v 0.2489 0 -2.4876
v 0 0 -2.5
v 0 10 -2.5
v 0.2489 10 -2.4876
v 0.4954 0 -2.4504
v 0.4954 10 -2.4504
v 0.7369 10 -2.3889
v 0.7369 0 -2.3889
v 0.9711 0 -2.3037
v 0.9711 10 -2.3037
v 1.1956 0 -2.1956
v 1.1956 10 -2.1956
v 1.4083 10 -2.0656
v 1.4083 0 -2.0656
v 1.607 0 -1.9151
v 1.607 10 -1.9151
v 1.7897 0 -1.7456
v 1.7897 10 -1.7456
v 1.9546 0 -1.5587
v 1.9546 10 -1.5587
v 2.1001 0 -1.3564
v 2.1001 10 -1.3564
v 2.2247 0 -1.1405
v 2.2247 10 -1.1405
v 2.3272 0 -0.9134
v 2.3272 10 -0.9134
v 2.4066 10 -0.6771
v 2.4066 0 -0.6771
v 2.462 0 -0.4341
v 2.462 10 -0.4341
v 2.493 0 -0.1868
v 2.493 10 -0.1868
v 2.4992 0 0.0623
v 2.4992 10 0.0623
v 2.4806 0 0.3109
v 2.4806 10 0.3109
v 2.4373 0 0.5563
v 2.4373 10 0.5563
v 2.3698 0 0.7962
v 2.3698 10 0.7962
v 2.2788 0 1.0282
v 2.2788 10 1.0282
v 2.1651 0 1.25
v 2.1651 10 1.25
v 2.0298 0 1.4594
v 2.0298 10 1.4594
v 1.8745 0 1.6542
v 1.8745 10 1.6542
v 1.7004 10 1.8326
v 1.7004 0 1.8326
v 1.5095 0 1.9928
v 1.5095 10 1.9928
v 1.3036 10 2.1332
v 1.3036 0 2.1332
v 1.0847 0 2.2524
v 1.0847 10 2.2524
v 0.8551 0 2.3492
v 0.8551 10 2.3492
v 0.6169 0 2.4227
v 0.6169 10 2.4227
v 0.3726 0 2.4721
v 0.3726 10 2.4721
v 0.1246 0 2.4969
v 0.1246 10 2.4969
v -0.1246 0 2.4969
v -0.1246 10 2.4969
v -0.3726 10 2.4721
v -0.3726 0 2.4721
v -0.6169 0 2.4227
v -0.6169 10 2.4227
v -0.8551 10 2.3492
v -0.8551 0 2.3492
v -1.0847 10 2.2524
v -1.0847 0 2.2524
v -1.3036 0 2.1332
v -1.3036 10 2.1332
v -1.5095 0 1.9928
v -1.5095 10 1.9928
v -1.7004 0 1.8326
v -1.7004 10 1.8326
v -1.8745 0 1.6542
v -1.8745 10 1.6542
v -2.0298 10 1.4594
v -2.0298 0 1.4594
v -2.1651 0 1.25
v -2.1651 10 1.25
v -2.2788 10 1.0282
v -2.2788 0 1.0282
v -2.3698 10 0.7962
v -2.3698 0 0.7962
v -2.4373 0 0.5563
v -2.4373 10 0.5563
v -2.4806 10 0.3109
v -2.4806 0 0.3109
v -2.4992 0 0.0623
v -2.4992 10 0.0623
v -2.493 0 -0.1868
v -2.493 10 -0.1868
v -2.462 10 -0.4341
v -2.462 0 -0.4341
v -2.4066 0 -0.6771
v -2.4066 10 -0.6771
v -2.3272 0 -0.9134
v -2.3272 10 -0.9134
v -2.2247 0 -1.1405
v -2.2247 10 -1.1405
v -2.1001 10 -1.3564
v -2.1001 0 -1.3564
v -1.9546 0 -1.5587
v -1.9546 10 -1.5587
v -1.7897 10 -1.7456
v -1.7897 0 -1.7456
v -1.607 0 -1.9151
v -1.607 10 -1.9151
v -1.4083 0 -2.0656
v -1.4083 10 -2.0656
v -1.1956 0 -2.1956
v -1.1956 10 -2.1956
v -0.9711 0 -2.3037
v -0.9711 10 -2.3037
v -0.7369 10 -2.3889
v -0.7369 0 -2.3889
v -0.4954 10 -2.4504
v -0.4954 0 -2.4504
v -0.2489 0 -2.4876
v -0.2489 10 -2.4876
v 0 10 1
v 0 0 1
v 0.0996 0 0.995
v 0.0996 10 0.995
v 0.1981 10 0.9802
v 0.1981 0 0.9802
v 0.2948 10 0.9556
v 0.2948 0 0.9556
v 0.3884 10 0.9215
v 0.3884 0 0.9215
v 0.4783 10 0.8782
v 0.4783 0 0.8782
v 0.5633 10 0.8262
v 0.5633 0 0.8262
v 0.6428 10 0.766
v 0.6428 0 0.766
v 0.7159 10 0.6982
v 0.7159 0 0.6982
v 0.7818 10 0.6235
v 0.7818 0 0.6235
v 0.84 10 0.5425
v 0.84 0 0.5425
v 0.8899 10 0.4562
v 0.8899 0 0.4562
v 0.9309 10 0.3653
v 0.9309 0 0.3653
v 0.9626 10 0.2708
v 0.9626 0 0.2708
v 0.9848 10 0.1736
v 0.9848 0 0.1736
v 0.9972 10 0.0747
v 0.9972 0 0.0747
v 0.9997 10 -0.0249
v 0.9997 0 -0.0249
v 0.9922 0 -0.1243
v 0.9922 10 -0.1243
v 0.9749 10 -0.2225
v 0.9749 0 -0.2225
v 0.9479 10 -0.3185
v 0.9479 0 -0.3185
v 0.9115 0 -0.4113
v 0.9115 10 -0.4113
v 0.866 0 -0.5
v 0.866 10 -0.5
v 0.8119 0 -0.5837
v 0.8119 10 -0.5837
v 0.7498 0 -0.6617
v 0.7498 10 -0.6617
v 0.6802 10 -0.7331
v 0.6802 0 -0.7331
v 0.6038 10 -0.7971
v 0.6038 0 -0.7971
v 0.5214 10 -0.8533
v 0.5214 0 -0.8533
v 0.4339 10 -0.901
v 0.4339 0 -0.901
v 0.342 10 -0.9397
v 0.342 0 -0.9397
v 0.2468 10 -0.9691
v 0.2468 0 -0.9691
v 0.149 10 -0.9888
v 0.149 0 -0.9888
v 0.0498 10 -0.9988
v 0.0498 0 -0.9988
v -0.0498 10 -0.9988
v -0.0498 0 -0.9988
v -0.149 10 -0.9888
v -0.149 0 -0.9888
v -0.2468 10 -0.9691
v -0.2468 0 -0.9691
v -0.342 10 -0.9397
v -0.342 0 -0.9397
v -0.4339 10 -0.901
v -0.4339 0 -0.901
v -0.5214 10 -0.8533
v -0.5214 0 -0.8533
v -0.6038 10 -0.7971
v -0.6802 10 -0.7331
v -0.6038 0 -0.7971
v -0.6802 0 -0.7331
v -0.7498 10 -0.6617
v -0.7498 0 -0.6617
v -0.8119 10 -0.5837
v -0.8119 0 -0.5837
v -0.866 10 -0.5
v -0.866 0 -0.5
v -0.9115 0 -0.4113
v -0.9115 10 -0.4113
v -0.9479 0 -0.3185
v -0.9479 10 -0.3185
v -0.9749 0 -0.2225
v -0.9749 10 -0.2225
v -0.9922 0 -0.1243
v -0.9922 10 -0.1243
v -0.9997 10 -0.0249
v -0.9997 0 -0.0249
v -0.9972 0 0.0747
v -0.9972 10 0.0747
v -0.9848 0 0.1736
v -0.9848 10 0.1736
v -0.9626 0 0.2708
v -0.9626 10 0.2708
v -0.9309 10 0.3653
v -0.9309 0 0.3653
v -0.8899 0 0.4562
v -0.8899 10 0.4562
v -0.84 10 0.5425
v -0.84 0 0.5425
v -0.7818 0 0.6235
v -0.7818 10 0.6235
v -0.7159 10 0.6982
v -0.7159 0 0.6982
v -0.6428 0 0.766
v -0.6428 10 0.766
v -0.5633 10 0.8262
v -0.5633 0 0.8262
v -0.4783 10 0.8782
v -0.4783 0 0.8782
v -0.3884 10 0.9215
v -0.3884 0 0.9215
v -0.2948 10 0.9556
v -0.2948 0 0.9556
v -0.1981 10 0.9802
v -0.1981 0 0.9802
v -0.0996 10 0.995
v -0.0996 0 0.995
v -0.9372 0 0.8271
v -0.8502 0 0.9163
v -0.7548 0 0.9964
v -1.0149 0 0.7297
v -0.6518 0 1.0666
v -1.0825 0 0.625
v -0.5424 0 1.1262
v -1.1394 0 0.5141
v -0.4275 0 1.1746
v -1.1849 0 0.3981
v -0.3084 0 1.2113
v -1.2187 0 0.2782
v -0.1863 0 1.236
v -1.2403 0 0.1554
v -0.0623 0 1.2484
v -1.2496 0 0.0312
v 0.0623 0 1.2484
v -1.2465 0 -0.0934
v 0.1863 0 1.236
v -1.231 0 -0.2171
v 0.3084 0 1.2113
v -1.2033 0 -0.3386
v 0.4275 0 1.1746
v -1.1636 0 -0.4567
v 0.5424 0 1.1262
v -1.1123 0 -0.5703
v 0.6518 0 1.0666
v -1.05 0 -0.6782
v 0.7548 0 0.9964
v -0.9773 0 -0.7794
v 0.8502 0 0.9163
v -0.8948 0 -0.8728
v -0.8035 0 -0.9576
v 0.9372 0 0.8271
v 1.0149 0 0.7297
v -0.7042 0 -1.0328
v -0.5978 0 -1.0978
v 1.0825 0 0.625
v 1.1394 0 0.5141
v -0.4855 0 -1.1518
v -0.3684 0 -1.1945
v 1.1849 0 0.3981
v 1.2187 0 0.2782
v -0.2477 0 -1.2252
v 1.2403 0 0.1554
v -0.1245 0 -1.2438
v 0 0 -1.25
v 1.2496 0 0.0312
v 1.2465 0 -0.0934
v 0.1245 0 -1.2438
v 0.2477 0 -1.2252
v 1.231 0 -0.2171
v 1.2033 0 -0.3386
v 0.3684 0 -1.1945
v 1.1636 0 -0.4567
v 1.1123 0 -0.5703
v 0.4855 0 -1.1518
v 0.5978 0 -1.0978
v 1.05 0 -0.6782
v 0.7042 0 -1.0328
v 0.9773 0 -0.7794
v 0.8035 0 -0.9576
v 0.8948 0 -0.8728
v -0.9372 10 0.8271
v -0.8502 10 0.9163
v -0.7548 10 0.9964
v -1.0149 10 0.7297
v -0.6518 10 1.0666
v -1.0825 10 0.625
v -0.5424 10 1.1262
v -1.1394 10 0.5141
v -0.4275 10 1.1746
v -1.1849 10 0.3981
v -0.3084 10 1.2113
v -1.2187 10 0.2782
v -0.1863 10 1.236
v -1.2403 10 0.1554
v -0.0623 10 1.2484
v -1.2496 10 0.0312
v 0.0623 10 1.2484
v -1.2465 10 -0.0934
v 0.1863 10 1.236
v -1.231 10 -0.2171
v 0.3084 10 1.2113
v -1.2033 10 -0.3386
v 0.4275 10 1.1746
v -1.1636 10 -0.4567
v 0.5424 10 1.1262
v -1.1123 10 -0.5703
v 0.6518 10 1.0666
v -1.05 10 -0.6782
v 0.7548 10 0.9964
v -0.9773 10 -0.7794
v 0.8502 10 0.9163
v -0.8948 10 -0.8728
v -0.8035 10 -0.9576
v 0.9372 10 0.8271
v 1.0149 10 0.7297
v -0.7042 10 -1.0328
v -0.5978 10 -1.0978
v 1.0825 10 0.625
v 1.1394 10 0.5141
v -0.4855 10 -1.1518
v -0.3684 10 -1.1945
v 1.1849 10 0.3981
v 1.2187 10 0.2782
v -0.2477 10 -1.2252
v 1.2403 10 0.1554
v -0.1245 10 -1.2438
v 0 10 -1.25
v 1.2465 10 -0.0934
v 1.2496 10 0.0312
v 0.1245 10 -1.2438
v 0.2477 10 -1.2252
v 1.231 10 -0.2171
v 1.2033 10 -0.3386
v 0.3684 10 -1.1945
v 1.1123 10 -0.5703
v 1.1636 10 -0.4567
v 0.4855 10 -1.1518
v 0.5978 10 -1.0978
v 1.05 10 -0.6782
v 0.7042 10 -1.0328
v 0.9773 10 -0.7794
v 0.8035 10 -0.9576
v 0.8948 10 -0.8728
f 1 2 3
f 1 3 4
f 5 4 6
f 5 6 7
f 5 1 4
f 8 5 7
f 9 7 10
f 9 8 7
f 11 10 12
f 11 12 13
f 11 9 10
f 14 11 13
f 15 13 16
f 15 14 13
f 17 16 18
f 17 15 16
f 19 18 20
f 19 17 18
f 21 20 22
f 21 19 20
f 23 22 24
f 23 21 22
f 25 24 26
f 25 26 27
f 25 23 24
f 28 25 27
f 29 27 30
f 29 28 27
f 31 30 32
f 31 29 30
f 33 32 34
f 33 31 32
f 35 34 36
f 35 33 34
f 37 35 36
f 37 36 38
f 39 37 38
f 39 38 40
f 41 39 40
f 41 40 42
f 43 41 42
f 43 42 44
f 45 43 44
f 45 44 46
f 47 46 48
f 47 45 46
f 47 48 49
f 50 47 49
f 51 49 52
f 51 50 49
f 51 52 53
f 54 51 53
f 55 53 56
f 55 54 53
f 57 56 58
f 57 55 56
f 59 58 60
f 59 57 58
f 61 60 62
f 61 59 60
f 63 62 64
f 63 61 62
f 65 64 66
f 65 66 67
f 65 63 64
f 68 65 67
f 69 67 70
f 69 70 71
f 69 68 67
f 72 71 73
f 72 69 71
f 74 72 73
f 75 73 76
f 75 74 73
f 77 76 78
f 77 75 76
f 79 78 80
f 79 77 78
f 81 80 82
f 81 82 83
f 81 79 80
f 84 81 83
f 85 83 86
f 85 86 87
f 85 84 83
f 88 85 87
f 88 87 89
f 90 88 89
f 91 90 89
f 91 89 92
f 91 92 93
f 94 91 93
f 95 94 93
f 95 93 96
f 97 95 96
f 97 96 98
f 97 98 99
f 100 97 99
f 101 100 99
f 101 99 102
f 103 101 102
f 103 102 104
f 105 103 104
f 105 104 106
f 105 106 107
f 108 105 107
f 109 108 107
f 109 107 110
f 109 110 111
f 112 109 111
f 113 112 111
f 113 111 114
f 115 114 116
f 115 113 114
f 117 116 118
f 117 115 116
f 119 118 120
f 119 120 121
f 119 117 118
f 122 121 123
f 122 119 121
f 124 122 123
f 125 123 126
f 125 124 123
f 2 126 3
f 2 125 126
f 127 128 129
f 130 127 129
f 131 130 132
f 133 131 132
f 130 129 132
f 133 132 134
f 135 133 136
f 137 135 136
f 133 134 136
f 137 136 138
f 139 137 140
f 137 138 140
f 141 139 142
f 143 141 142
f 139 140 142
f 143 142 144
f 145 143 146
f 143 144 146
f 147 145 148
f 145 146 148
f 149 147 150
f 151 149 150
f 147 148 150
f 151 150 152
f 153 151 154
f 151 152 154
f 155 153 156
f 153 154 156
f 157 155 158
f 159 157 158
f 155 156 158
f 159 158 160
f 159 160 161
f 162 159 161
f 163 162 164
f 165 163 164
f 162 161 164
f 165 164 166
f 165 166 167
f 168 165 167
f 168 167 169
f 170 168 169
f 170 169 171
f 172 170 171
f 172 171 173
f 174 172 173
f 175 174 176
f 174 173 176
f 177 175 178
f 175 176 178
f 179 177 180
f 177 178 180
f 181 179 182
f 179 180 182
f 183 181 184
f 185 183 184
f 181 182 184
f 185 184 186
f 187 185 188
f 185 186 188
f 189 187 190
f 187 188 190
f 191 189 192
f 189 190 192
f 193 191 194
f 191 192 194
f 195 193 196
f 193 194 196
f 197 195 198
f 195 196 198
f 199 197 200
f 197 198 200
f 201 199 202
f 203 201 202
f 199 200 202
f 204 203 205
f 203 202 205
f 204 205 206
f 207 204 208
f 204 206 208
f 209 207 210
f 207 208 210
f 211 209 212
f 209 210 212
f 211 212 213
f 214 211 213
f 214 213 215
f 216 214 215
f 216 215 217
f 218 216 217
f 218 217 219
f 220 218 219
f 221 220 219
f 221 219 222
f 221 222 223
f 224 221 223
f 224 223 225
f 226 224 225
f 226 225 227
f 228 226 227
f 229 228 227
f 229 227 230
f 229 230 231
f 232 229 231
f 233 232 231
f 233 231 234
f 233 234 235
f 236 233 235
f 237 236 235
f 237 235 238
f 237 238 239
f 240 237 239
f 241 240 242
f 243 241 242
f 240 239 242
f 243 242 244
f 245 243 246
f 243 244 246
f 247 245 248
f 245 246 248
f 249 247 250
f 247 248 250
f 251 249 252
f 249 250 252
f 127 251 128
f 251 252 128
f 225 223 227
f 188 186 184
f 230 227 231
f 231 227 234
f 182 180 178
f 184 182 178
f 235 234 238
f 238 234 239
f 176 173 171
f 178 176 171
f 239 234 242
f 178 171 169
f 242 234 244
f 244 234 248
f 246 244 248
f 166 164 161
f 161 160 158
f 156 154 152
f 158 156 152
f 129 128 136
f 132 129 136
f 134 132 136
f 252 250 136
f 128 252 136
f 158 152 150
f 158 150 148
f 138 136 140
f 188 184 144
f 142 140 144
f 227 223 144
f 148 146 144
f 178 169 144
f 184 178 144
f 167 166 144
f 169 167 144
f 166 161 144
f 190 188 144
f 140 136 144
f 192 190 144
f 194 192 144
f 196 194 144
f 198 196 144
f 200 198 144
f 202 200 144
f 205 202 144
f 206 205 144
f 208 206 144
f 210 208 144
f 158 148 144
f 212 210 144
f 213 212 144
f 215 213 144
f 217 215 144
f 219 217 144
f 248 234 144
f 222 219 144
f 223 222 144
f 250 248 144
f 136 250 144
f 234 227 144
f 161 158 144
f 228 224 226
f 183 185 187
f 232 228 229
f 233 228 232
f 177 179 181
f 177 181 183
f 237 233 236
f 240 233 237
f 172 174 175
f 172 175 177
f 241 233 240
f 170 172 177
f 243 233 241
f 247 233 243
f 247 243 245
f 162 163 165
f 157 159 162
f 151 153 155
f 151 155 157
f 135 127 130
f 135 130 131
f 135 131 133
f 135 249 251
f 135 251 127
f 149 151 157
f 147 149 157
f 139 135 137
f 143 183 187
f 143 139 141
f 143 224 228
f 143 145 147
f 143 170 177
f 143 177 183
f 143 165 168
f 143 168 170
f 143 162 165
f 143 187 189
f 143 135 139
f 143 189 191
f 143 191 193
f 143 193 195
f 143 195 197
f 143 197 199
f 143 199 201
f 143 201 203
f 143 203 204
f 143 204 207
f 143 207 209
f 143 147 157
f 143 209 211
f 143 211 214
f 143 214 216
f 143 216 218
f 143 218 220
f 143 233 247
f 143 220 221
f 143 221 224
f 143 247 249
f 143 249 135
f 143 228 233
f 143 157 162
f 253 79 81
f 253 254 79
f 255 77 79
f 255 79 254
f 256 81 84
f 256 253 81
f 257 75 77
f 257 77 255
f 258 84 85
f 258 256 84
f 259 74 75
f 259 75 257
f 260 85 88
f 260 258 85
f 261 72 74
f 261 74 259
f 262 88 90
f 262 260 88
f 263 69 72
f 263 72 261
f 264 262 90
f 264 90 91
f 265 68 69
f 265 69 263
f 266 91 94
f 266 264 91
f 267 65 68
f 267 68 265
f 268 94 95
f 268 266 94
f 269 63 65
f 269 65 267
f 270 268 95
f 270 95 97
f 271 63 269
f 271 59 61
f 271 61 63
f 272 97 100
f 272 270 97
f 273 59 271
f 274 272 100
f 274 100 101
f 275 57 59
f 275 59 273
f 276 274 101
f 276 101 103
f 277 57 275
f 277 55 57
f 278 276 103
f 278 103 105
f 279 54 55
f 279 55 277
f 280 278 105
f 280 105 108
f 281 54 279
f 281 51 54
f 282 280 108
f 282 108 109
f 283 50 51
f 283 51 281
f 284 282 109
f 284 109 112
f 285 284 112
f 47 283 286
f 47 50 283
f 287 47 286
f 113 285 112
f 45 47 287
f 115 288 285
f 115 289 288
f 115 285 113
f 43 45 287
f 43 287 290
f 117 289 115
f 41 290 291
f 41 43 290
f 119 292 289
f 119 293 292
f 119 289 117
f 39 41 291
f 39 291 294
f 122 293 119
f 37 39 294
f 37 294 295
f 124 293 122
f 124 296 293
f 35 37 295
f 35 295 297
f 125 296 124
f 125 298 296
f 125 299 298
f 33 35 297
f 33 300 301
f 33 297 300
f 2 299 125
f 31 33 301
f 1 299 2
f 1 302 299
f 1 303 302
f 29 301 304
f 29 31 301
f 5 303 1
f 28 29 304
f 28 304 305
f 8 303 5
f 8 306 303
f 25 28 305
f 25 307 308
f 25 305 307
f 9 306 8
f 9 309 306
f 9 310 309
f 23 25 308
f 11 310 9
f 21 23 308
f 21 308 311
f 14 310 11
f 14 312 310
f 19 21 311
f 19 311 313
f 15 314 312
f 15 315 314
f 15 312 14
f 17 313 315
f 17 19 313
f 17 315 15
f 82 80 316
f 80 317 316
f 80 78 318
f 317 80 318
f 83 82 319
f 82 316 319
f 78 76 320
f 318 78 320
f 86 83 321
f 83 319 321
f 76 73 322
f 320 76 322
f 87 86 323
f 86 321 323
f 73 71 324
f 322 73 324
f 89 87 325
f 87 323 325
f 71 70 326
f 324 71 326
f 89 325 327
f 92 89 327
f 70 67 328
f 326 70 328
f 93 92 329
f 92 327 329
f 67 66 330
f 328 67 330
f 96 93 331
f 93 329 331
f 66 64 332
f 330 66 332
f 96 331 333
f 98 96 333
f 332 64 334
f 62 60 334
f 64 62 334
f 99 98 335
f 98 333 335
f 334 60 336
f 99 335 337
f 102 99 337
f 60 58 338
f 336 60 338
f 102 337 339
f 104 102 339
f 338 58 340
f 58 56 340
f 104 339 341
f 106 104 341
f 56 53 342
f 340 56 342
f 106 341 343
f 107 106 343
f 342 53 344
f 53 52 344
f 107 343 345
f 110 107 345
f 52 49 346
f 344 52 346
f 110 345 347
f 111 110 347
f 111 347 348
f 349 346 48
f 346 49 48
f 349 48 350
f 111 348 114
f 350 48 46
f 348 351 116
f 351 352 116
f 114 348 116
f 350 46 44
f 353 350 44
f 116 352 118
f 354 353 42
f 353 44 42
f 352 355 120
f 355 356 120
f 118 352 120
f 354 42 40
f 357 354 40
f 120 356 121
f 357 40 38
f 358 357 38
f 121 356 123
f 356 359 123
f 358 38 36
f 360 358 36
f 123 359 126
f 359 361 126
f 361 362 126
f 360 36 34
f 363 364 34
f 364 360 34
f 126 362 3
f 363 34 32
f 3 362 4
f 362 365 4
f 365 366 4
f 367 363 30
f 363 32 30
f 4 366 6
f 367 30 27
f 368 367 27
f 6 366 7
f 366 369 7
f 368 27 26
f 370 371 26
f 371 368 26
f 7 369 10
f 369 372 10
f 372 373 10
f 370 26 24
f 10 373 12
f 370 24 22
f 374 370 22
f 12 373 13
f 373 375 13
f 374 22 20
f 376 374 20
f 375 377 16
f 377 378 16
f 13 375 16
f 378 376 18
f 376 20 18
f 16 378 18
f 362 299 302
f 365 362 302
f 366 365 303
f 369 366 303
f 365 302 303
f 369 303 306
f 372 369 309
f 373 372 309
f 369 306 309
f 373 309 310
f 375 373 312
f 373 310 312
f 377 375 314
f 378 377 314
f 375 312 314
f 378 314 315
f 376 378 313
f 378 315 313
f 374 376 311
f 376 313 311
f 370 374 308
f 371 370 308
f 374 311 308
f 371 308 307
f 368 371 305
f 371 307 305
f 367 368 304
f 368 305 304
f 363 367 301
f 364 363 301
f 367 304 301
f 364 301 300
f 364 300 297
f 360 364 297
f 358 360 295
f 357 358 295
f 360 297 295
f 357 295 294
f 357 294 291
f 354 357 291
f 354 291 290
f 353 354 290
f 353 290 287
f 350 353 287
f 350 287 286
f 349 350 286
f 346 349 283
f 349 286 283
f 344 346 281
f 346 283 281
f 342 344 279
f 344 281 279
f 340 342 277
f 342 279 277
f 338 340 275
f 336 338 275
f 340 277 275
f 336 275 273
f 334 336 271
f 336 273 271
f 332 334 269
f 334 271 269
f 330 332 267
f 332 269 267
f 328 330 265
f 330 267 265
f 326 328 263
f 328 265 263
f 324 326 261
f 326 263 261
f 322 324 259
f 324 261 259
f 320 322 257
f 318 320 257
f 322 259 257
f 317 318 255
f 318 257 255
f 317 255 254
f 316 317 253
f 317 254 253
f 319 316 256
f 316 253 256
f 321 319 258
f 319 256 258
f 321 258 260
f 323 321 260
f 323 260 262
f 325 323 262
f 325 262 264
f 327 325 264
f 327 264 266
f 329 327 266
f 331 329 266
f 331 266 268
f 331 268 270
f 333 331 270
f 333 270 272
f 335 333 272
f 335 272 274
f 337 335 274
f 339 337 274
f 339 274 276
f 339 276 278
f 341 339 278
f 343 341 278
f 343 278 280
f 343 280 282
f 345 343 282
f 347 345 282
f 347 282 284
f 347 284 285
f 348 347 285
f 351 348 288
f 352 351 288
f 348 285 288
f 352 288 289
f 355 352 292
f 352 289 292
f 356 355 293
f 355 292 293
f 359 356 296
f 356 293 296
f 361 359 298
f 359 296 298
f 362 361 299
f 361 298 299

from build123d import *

# Parameters (mm, degrees)
SKETCH1_R           = 1
BOSS_EXTRUDE1_DEPTH = 10
SKETCH2_R           = 2.5
SKETCH2_R_2         = 1.25
BOSS_EXTRUDE2_DEPTH = 10


with BuildPart() as part:
    # Sketch1 → Boss-Extrude1 (new body)
    with BuildSketch(Plane(origin=(0, 0, 0), x_dir=(1, 0, 0), z_dir=(0, 1, 0))):
        with Locations(Location((0, 0, 0), (0, 0, 270))):
            Circle(SKETCH1_R)
    extrude(amount=BOSS_EXTRUDE1_DEPTH)


with BuildPart() as body_2:
    # Sketch2 → Boss-Extrude2 (new body)
    with BuildSketch(Plane.XZ):
        with Locations(Location((0, 0, 0), (0, 0, 270))):
            Circle(SKETCH2_R)
        with Locations(Location((0, 0, 0), (0, 0, 270))):
            Circle(SKETCH2_R_2, mode=Mode.SUBTRACT)
    extrude(amount=-BOSS_EXTRUDE2_DEPTH)


solid = Compound([part.part, body_2.part])
